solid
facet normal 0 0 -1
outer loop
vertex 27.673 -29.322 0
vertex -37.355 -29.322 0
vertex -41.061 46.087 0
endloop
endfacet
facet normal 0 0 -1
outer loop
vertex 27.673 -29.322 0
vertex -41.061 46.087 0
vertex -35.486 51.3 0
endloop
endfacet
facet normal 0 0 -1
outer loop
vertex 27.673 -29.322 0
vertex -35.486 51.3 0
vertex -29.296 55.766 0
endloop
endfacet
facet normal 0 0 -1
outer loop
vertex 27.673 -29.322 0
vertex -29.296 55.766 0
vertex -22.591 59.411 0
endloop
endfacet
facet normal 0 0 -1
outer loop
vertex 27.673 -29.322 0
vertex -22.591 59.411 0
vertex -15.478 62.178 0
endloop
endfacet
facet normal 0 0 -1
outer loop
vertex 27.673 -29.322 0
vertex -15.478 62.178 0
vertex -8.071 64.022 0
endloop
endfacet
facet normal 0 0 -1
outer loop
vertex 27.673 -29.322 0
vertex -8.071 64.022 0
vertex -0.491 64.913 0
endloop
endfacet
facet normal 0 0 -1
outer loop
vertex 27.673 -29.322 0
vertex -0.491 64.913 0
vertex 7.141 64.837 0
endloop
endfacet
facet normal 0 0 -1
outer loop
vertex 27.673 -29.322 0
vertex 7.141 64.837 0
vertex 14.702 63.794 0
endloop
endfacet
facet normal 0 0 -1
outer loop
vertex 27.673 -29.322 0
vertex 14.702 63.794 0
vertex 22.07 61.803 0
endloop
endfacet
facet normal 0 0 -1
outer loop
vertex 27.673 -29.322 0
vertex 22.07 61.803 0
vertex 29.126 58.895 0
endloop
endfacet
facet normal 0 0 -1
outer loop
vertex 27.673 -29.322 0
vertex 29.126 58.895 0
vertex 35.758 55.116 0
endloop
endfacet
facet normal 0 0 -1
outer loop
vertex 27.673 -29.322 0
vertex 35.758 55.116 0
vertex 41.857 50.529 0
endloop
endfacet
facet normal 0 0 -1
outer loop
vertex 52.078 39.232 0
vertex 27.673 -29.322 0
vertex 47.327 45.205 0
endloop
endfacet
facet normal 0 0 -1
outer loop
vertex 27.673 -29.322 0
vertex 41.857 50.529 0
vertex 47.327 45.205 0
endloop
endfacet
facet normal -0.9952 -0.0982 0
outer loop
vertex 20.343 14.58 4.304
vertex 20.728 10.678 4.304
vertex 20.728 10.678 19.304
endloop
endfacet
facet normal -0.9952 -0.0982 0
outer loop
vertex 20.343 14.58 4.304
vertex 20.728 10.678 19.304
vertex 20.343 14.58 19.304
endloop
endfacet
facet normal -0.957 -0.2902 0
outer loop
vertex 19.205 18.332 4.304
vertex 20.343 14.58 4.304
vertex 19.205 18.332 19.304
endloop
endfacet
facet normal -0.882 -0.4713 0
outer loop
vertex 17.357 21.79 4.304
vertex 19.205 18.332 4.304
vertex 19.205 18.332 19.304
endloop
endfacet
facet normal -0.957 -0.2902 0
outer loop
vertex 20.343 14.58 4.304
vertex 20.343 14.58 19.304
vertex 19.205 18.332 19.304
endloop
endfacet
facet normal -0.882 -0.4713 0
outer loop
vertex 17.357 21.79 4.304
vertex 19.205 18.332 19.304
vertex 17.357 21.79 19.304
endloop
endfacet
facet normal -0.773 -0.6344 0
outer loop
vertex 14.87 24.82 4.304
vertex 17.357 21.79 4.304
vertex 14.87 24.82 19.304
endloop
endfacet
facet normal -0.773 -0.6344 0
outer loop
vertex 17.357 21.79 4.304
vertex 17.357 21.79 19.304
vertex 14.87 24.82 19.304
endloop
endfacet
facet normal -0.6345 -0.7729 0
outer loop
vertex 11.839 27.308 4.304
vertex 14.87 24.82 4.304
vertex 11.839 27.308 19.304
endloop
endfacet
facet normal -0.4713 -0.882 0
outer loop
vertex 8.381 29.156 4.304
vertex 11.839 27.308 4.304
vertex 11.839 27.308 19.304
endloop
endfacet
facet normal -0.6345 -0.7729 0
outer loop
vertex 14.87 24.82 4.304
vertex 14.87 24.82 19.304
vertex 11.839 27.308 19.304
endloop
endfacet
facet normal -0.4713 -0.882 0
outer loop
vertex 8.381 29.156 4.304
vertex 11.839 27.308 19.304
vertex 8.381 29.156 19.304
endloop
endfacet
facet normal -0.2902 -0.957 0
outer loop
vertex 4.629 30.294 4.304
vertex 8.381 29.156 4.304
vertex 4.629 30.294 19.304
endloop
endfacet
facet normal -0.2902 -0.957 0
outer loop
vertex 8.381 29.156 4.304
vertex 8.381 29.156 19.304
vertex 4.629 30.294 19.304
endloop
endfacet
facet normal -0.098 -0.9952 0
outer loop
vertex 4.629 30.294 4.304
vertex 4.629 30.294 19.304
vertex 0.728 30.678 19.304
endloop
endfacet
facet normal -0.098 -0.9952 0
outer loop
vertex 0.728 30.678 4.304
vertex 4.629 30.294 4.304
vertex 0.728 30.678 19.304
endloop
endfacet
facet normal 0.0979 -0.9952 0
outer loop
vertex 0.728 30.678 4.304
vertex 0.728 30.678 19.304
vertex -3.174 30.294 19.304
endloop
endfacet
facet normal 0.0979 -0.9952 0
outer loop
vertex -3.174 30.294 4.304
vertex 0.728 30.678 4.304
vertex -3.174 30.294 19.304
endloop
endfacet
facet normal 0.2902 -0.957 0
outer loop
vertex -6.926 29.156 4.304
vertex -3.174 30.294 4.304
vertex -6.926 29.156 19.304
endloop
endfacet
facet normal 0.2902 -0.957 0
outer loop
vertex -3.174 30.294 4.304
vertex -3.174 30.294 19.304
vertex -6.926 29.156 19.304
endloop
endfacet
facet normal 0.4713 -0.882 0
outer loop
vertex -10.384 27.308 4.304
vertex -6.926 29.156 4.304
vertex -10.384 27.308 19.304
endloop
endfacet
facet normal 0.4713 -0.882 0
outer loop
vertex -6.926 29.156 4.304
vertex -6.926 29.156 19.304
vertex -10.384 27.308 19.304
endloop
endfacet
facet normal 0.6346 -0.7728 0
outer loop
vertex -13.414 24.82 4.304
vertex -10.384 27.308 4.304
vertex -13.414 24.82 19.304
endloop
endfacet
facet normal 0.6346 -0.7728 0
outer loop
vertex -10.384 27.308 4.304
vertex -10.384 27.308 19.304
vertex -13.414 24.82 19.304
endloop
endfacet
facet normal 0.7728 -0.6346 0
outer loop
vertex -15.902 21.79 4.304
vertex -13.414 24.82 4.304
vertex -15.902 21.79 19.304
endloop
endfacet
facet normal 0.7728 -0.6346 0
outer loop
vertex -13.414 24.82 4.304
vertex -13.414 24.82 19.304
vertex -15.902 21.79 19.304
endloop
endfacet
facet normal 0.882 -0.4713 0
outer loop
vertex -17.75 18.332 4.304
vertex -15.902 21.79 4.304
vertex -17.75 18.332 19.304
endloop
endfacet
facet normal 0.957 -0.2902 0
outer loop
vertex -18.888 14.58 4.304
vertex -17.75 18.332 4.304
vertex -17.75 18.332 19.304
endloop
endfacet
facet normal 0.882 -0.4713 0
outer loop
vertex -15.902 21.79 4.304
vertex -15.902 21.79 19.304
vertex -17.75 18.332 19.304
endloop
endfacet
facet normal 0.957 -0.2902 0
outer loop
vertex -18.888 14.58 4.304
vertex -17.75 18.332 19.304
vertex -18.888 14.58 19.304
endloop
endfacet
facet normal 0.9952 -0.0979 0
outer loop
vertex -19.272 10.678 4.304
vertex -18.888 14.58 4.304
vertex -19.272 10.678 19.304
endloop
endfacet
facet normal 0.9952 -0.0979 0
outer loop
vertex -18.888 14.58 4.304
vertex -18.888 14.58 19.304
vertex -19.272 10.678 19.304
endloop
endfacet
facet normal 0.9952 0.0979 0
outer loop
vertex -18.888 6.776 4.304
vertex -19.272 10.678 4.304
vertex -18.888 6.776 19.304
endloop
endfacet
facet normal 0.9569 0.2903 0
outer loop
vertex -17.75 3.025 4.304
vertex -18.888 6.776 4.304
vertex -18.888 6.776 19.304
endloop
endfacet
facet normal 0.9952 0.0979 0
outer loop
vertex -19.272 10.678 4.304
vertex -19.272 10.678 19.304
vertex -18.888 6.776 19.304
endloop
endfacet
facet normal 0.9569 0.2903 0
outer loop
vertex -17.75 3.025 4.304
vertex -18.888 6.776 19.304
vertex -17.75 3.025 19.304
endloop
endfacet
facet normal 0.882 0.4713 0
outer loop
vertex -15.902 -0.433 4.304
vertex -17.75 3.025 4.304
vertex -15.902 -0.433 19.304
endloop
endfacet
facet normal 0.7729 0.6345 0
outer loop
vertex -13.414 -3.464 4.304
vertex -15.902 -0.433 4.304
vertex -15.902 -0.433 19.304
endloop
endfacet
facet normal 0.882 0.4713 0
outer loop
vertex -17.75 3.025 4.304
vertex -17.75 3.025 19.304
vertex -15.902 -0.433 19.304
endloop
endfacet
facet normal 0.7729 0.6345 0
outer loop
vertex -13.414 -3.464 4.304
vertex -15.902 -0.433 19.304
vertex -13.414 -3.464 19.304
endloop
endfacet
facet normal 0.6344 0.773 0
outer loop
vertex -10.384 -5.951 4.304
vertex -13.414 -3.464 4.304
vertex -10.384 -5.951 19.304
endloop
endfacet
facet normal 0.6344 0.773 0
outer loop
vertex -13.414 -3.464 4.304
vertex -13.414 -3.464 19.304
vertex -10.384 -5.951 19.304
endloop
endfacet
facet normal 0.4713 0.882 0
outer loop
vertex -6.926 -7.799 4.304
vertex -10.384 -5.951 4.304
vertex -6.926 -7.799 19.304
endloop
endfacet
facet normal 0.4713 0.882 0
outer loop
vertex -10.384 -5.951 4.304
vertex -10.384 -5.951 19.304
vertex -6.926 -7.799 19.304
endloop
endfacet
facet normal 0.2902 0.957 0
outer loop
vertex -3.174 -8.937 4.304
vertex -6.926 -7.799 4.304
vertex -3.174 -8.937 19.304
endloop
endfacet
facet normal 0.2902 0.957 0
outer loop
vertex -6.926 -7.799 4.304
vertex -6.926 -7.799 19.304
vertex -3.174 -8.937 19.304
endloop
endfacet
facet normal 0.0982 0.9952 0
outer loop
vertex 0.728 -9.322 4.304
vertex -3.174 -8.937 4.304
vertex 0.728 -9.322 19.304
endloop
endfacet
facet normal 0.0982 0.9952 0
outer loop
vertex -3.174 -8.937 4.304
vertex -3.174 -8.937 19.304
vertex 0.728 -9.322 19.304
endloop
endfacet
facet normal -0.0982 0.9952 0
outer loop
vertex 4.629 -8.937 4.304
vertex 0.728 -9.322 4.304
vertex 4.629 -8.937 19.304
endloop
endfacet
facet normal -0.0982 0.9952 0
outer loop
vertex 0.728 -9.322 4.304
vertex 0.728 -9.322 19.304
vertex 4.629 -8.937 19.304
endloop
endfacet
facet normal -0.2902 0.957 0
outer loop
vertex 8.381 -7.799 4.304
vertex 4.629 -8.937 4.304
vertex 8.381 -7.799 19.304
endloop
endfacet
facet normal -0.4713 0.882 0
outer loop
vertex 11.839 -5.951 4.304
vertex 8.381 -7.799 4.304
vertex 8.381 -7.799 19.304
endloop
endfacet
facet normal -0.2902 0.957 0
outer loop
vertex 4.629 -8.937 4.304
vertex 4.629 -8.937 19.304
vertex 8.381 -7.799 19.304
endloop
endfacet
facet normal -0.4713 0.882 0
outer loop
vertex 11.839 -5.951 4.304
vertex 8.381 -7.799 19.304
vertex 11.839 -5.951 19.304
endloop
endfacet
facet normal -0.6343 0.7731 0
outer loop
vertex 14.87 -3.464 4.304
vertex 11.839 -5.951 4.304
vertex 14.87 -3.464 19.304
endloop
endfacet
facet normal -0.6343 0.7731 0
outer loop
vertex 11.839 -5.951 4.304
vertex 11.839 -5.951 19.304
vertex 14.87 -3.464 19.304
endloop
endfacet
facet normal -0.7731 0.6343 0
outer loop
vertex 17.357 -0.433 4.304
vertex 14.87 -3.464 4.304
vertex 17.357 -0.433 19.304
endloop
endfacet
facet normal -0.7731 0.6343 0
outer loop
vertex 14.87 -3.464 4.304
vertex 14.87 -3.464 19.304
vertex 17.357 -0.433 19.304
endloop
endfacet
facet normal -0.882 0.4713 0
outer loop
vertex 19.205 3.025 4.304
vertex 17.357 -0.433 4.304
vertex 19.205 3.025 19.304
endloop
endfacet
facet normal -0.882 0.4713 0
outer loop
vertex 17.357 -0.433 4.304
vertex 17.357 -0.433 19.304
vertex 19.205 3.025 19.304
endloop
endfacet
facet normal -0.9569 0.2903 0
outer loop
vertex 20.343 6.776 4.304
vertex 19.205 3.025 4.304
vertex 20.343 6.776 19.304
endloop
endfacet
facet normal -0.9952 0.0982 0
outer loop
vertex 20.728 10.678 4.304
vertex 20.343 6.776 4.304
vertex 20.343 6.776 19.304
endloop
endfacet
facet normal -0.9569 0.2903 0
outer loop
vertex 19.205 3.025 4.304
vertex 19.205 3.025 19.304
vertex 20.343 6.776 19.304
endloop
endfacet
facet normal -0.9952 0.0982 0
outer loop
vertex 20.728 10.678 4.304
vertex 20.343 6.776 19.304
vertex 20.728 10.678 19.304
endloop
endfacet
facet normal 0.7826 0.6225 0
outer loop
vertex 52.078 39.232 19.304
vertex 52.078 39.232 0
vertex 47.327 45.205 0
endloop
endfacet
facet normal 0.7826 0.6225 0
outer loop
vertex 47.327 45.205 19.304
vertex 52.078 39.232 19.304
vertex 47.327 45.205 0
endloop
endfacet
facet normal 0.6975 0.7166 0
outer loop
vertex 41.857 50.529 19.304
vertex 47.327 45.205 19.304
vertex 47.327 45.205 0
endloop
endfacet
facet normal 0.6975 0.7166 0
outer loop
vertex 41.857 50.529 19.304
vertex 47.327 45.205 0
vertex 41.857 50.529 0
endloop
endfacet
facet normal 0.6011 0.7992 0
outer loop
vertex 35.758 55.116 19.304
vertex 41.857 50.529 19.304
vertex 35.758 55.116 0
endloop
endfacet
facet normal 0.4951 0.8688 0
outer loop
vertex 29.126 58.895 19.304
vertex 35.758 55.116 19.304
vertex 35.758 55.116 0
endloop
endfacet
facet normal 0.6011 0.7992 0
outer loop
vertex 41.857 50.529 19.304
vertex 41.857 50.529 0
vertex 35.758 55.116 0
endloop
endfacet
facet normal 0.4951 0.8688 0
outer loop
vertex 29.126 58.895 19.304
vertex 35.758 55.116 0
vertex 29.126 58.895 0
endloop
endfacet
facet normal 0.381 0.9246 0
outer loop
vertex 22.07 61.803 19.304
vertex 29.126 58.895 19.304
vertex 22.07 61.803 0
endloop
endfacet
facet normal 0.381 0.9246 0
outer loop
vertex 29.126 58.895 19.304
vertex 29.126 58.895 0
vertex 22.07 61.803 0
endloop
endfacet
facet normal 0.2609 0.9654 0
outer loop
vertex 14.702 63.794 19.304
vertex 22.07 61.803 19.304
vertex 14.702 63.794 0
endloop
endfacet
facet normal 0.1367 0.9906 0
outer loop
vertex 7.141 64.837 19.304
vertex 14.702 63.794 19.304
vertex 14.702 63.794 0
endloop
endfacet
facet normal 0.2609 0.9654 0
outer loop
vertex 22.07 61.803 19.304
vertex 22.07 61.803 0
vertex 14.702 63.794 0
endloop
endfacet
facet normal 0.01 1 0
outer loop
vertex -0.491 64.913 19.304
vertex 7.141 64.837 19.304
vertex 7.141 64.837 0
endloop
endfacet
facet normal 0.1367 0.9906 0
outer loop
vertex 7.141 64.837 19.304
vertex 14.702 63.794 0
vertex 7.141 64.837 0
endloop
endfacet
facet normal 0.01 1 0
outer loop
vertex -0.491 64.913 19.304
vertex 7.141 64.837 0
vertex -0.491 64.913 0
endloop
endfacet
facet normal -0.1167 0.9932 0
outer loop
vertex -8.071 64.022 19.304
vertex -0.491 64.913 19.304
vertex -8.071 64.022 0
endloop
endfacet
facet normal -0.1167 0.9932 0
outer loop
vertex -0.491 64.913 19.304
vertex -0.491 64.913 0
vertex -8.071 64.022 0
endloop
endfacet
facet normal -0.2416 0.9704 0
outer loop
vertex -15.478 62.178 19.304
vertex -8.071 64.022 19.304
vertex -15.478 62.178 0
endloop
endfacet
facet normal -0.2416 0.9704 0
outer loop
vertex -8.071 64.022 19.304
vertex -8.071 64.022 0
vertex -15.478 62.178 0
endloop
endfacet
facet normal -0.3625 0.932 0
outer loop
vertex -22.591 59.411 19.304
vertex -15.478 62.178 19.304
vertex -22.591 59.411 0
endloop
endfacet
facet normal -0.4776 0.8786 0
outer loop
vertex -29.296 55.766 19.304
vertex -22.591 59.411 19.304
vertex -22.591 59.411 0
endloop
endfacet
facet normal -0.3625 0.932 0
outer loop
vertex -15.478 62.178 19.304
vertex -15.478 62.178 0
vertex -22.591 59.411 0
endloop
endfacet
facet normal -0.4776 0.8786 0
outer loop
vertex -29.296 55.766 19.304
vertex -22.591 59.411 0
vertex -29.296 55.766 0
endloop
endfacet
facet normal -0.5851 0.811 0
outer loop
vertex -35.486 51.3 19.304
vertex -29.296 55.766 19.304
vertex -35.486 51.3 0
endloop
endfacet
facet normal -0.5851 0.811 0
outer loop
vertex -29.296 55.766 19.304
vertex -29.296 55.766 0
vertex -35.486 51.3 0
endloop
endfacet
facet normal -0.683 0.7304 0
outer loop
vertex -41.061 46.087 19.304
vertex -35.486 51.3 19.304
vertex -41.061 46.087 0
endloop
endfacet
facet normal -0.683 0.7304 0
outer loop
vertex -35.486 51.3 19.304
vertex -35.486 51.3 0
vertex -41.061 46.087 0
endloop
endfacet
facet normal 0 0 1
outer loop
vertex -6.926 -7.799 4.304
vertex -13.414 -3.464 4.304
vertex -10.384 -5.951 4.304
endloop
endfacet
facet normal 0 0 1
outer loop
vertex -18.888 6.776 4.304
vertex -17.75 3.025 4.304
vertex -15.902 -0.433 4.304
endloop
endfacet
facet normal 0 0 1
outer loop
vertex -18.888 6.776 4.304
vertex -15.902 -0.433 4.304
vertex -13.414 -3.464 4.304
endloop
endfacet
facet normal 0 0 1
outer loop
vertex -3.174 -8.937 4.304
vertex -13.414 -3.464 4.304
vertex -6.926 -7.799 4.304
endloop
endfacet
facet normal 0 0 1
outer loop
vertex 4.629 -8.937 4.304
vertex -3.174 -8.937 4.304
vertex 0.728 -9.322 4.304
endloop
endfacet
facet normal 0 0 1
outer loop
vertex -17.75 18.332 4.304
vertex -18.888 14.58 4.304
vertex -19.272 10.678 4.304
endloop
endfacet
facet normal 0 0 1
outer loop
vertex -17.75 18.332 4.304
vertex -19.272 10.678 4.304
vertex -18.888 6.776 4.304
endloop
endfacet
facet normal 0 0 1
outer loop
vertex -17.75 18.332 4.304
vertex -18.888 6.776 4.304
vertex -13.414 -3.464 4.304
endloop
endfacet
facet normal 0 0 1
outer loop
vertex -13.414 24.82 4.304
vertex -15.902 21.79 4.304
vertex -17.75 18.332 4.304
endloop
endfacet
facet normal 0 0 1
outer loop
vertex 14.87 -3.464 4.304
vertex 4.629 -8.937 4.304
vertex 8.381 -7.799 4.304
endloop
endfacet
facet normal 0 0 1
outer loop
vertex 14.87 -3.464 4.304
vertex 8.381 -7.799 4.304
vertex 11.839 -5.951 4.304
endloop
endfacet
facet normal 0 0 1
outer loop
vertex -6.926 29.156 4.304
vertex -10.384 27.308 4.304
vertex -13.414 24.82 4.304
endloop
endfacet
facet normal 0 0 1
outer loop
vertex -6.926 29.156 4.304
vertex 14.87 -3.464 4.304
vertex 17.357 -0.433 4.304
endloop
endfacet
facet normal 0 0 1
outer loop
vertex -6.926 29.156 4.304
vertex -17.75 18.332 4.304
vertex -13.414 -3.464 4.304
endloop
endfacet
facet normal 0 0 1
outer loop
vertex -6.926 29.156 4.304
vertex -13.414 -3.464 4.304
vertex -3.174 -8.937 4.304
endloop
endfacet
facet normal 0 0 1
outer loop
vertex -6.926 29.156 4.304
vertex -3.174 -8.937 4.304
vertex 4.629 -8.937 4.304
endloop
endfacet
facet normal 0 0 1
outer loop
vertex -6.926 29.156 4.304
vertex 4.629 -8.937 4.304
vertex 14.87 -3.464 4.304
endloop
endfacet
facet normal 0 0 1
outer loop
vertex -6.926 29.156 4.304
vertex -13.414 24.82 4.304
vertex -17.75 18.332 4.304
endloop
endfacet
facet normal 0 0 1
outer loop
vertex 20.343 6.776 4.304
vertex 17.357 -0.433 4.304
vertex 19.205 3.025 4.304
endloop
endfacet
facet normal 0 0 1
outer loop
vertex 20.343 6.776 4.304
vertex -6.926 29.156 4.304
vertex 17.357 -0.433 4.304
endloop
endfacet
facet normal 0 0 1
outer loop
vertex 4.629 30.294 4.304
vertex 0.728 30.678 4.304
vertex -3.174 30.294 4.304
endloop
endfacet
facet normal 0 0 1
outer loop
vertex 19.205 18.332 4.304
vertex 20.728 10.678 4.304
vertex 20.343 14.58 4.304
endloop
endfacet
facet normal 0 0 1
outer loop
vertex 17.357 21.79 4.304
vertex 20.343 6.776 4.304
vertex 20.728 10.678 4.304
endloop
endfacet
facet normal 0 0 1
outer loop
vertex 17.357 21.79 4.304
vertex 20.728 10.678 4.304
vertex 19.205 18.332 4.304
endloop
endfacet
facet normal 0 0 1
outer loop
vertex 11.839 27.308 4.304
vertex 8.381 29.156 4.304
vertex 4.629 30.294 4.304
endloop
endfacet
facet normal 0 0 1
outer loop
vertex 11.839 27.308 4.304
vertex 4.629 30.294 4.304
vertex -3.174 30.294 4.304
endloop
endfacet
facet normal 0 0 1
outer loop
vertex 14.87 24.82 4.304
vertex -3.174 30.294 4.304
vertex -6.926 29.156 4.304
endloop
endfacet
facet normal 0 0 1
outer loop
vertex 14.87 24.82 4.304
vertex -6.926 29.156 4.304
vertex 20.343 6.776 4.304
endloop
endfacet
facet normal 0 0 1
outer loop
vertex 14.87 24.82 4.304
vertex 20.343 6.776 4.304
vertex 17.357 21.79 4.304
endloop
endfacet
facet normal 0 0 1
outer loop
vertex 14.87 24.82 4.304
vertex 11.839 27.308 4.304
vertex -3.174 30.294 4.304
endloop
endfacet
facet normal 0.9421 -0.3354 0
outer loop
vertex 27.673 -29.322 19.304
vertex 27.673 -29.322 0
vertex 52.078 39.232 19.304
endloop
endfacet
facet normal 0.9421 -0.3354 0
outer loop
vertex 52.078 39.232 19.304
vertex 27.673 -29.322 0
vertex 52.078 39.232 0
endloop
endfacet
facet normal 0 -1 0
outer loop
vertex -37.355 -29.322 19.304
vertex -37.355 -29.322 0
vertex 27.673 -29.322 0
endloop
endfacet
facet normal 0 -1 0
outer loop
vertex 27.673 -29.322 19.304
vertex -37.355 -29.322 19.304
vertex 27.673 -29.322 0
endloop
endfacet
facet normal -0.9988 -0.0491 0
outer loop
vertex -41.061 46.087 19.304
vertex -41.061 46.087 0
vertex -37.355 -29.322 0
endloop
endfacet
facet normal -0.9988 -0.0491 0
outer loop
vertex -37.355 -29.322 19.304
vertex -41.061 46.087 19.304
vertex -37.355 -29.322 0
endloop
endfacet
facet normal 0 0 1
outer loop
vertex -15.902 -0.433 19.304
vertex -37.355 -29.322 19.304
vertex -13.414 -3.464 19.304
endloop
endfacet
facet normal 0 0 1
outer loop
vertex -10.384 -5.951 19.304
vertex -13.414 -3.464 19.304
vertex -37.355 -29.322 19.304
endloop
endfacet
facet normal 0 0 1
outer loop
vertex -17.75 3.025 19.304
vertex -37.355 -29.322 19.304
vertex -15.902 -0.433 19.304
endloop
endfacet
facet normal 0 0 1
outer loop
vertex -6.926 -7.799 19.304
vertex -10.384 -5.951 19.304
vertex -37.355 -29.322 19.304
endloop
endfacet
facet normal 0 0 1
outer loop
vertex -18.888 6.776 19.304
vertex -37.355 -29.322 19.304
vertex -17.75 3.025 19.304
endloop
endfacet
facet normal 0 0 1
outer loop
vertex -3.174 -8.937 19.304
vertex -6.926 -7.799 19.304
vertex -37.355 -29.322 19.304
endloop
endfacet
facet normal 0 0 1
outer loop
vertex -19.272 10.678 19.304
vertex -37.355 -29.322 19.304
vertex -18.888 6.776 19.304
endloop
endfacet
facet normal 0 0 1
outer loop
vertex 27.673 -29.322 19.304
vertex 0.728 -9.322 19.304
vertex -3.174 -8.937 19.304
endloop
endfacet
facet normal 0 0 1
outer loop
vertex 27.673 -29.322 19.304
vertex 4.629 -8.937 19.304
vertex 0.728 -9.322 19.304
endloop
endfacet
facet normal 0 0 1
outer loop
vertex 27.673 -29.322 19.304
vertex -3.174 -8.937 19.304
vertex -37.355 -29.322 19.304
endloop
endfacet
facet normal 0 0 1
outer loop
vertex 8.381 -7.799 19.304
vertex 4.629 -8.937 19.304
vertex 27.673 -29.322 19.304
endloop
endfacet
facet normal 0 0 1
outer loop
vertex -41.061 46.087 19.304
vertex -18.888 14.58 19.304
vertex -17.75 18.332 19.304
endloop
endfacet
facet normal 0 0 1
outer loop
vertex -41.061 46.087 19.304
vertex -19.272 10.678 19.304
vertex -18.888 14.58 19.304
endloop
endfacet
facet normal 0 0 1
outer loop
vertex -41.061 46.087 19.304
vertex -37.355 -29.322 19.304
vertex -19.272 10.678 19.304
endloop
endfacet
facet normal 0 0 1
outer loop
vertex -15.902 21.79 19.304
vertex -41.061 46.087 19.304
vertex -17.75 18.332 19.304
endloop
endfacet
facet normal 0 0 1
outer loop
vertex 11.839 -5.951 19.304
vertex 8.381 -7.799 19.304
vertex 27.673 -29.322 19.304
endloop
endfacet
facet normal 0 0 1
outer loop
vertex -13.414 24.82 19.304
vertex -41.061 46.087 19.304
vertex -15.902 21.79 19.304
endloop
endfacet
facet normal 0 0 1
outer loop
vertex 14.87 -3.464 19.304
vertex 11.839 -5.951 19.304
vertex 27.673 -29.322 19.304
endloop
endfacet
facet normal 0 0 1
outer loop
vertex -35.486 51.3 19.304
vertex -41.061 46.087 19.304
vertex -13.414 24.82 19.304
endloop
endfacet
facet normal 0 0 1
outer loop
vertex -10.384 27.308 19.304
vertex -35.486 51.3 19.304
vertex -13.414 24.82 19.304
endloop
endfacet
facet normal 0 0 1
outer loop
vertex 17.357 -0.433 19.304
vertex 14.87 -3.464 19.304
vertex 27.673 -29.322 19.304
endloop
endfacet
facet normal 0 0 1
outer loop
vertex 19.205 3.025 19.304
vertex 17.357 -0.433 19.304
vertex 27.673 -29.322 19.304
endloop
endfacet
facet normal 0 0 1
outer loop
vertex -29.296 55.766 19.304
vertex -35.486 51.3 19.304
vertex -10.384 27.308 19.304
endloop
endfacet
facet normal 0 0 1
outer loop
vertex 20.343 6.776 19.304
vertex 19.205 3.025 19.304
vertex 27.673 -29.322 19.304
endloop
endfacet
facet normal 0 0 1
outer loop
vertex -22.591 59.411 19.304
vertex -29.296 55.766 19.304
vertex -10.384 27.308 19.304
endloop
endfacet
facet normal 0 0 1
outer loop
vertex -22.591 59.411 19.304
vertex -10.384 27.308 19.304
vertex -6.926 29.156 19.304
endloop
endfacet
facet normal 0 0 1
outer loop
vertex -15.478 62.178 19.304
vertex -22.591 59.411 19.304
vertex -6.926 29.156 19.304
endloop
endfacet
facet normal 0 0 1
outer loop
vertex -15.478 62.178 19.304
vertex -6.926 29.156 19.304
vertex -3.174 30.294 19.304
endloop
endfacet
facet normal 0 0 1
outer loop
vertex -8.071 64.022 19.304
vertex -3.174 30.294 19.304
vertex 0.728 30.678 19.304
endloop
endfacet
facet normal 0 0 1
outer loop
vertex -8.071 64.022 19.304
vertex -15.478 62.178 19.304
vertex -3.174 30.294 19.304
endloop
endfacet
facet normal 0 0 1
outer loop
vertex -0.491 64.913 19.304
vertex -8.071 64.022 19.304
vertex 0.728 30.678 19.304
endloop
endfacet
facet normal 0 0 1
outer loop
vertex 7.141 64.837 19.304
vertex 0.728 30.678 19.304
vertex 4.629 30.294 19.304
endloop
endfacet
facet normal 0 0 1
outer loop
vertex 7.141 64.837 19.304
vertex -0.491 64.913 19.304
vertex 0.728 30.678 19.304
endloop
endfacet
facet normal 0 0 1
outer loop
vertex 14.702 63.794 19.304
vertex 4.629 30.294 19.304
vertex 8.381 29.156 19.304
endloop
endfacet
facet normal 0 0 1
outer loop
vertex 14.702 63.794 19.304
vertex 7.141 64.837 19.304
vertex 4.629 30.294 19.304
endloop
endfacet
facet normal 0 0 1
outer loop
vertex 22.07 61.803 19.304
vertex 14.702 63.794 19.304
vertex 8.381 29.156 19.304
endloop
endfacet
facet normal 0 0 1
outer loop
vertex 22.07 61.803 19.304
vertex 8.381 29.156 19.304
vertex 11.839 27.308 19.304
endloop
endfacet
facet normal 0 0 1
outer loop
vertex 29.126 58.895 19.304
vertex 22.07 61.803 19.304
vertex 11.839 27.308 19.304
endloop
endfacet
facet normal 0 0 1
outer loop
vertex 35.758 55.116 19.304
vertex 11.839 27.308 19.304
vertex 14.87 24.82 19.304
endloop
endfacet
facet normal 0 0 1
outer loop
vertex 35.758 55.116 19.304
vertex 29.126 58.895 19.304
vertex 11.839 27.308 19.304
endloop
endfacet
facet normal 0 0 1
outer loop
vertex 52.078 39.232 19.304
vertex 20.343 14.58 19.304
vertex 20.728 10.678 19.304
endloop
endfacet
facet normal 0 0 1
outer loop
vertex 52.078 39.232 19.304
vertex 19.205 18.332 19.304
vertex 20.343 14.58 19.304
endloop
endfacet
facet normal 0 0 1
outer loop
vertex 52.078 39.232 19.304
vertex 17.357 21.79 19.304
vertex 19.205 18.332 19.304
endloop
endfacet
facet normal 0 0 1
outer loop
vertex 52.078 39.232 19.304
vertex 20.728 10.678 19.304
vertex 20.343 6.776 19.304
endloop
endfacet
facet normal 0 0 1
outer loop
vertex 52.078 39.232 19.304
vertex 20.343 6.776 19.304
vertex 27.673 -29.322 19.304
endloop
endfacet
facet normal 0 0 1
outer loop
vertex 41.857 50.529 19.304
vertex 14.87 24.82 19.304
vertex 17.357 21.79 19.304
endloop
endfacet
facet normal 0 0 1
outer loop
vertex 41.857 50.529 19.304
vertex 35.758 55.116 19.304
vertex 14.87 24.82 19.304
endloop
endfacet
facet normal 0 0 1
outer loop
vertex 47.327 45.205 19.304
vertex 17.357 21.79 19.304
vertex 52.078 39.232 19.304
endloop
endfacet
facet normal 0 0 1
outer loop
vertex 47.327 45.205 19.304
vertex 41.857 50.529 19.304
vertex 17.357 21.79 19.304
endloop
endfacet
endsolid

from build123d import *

# Parameters (mm, degrees)
F1_DEPTH = 19.304
F2_R     = 20
F3_DEPTH = 15


with BuildPart() as f1:
    # F0 (on Top) → F1 (new body)
    with BuildSketch(Plane.XY):
        with BuildLine():
            ThreePointArc((52.077811, 39.231941), (7.140875, 64.836505), (-41.060608, 46.087135))
            Line((-41.060608, 46.087135), (-37.354928, -29.32171))
            Line((-37.354928, -29.32171), (27.672678, -29.32171))
            Line((27.672678, -29.32171), (52.077811, 39.231941))
        make_face()
    extrude(amount=F1_DEPTH)

    # F2 (on face) → F3 (cut)
    with BuildSketch(Plane.XY.offset(19.304)):
        with Locations((0.727693, 10.67829)):
            Circle(F2_R)
    extrude(amount=-F3_DEPTH, mode=Mode.SUBTRACT)


solid = f1.part
